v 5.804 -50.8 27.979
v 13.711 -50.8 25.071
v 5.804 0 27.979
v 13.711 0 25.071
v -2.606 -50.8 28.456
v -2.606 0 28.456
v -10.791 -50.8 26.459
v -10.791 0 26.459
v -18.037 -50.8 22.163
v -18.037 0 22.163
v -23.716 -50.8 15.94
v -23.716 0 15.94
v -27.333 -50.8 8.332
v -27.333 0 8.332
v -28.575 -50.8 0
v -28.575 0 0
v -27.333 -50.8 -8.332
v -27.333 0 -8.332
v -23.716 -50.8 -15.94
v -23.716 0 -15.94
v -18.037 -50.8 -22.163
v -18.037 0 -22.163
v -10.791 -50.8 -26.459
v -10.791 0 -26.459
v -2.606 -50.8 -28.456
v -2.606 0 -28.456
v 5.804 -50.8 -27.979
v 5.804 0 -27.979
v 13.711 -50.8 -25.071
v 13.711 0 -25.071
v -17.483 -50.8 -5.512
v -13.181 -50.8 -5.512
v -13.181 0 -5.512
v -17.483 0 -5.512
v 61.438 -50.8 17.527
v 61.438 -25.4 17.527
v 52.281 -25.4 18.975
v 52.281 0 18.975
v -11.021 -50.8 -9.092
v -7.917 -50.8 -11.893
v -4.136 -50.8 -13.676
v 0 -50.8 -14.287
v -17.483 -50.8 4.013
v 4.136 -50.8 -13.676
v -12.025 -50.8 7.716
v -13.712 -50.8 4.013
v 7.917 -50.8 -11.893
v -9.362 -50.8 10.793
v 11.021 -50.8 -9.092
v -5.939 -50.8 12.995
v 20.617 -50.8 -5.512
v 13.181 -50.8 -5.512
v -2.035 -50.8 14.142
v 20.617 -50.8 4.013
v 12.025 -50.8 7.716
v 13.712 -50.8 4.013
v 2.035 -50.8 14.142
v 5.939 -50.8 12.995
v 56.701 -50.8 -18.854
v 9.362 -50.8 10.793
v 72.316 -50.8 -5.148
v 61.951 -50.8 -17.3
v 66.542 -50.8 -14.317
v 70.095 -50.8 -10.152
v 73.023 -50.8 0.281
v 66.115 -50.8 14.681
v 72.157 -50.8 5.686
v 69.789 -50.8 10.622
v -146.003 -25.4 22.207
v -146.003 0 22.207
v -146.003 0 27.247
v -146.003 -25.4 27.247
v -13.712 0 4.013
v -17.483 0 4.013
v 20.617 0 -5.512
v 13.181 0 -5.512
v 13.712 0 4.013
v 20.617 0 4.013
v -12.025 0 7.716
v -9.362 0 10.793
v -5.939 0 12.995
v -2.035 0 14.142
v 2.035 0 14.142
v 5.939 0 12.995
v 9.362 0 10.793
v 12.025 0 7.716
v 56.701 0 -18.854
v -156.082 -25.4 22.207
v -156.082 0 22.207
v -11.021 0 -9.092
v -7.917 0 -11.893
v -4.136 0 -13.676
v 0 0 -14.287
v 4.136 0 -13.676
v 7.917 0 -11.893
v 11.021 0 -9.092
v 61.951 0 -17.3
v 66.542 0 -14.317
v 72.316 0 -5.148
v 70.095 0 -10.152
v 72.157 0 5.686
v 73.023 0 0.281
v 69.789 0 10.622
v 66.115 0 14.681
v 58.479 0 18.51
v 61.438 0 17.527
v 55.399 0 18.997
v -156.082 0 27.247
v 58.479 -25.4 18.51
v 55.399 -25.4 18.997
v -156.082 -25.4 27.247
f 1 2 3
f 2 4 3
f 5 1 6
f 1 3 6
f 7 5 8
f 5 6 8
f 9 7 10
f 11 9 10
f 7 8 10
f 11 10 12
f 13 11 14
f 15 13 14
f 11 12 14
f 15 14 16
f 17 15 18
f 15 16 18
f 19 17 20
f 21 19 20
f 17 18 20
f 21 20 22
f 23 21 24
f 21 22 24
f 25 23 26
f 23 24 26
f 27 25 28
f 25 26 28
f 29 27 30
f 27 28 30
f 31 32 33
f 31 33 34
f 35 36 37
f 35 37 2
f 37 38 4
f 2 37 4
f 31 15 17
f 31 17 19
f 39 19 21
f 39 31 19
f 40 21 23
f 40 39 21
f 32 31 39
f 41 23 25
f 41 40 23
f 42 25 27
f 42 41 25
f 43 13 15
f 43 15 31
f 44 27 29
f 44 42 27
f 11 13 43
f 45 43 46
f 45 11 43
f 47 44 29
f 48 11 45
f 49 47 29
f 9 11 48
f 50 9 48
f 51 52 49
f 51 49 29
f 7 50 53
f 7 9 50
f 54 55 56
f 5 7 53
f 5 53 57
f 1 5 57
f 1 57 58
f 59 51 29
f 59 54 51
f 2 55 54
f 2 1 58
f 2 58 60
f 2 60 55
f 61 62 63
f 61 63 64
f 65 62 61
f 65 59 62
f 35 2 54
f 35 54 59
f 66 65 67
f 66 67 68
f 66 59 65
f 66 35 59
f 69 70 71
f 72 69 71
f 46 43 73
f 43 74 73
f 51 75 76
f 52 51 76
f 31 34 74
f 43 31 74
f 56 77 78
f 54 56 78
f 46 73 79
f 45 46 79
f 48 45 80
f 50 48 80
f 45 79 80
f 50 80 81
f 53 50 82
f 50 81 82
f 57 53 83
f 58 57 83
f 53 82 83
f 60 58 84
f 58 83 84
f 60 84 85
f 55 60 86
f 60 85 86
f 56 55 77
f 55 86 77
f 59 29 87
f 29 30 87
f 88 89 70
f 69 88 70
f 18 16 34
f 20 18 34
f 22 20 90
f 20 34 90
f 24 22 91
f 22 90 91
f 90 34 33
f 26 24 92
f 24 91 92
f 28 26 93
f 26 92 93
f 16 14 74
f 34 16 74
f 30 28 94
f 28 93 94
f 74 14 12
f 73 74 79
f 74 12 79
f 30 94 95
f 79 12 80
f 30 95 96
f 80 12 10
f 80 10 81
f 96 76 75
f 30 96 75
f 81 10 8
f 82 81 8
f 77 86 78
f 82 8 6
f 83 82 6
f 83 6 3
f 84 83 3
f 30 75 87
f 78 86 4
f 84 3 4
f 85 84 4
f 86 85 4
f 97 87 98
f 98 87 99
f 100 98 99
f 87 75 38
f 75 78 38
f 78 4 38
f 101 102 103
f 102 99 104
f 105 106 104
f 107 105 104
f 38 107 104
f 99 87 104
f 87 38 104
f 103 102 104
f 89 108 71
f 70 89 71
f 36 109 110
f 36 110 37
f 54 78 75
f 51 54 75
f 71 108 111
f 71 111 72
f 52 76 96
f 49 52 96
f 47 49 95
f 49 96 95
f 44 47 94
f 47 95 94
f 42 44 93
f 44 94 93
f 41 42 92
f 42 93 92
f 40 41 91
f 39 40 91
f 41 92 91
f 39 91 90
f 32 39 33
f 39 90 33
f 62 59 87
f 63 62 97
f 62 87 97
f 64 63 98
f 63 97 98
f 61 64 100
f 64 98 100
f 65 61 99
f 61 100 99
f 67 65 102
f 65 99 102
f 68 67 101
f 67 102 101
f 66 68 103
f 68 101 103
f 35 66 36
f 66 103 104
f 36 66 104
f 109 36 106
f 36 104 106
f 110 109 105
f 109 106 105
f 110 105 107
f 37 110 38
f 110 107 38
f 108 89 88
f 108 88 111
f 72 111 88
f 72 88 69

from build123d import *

# Parameters (mm, degrees)
F0_R     = 14.2875
F1_DEPTH = 25.4
F2_DEPTH = 25.4
F3_DEPTH = 25.4
F5_DEPTH = 25.4
F0_W     = 10.0799947977
F0_H     = 5.0400011241


with BuildPart() as f1:
    # F0 (on Front) → F1 (new body)
    with BuildSketch(Plane.XZ):
        with BuildLine():
            ThreePointArc((13.7108012033, -25.0707908803), (24.5796335345, -14.572996957), (28.575, 0))
            ThreePointArc((28.575, 0), (24.5796335345, 14.572996957), (13.7108012033, 25.0707908803))
            ThreePointArc((13.7108012033, 25.0707908803), (-28.575, 0), (13.7108012033, -25.0707908803))
        make_face()
        with BuildLine():
            ThreePointArc((-13.7124942196, 4.0125002839), (0, 14.2875), (13.7124942196, 4.0125002839))
            Line((13.7124942196, 4.0125002839), (20.6174994767, 4.0125002839))
            Line((20.6174994767, 4.0125002839), (20.6174994767, -5.5124997161))
            Line((20.6174994767, -5.5124997161), (13.181236783, -5.5124997161))
            ThreePointArc((13.181236783, -5.5124997161), (0, -14.2875), (-13.181236783, -5.5124997161))
            Line((-13.181236783, -5.5124997161), (-17.4825005233, -5.5124997161))
            Line((-17.4825005233, -5.5124997161), (-17.4825005233, 4.0125002839))
            Line((-17.4825005233, 4.0125002839), (-13.7124942196, 4.0125002839))
        make_face(mode=Mode.SUBTRACT)
        with BuildLine():
            Line((61.4379927645, 17.5272998205), (52.2812851863, 18.9745574423))
            ThreePointArc((52.2812851863, 18.9745574423), (35.0537329802, -2.2109170872), (56.7014723756, -18.8538815204))
            ThreePointArc((56.7014723756, -18.8538815204), (68.3771144065, -12.4692261437), (73.025, 0))
            ThreePointArc((73.025, 0), (69.8663893691, 10.5055339664), (61.4379927645, 17.5272998205))
        make_face()
        with Locations((53.975, 0)):
            Circle(F0_R, mode=Mode.SUBTRACT)
        with BuildLine():
            ThreePointArc((13.7108012033, 25.0707908803), (24.5796335345, 14.572996957), (28.575, 0))
            ThreePointArc((28.575, 0), (24.5796335345, -14.572996957), (13.7108012033, -25.0707908803))
            Line((13.7108012033, -25.0707908803), (56.7014723756, -18.8538815204))
            ThreePointArc((56.7014723756, -18.8538815204), (35.0537329802, -2.2109170872), (52.2812851863, 18.9745574423))
            Line((52.2812851863, 18.9745574423), (13.7108012033, 25.0707908803))
        make_face()
        with Locations((53.975, 0)):
            Circle(F0_R)
    extrude(amount=F1_DEPTH)

    # F0 (on Front) → F2 (join)
    with BuildSketch(Plane.XZ):
        with BuildLine():
            ThreePointArc((13.7108012033, -25.0707908803), (24.5796335345, -14.572996957), (28.575, 0))
            ThreePointArc((28.575, 0), (24.5796335345, 14.572996957), (13.7108012033, 25.0707908803))
            ThreePointArc((13.7108012033, 25.0707908803), (-28.575, 0), (13.7108012033, -25.0707908803))
        make_face()
        with BuildLine():
            ThreePointArc((-13.7124942196, 4.0125002839), (0, 14.2875), (13.7124942196, 4.0125002839))
            Line((13.7124942196, 4.0125002839), (20.6174994767, 4.0125002839))
            Line((20.6174994767, 4.0125002839), (20.6174994767, -5.5124997161))
            Line((20.6174994767, -5.5124997161), (13.181236783, -5.5124997161))
            ThreePointArc((13.181236783, -5.5124997161), (0, -14.2875), (-13.181236783, -5.5124997161))
            Line((-13.181236783, -5.5124997161), (-17.4825005233, -5.5124997161))
            Line((-17.4825005233, -5.5124997161), (-17.4825005233, 4.0125002839))
            Line((-17.4825005233, 4.0125002839), (-13.7124942196, 4.0125002839))
        make_face(mode=Mode.SUBTRACT)
    extrude(amount=F2_DEPTH)

    # F0 (on Front) → F3 (join)
    with BuildSketch(Plane.XZ):
        with BuildLine():
            ThreePointArc((13.7108012033, 25.0707908803), (24.5796335345, 14.572996957), (28.575, 0))
            ThreePointArc((28.575, 0), (24.5796335345, -14.572996957), (13.7108012033, -25.0707908803))
            Line((13.7108012033, -25.0707908803), (56.7014723756, -18.8538815204))
            ThreePointArc((56.7014723756, -18.8538815204), (35.0537329802, -2.2109170872), (52.2812851863, 18.9745574423))
            Line((52.2812851863, 18.9745574423), (13.7108012033, 25.0707908803))
        make_face()
        with BuildLine():
            ThreePointArc((13.7108012033, -25.0707908803), (24.5796335345, -14.572996957), (28.575, 0))
            ThreePointArc((28.575, 0), (24.5796335345, 14.572996957), (13.7108012033, 25.0707908803))
            ThreePointArc((13.7108012033, 25.0707908803), (-28.575, 0), (13.7108012033, -25.0707908803))
        make_face()
        with BuildLine():
            ThreePointArc((-13.7124942196, 4.0125002839), (0, 14.2875), (13.7124942196, 4.0125002839))
            Line((13.7124942196, 4.0125002839), (20.6174994767, 4.0125002839))
            Line((20.6174994767, 4.0125002839), (20.6174994767, -5.5124997161))
            Line((20.6174994767, -5.5124997161), (13.181236783, -5.5124997161))
            ThreePointArc((13.181236783, -5.5124997161), (0, -14.2875), (-13.181236783, -5.5124997161))
            Line((-13.181236783, -5.5124997161), (-17.4825005233, -5.5124997161))
            Line((-17.4825005233, -5.5124997161), (-17.4825005233, 4.0125002839))
            Line((-17.4825005233, 4.0125002839), (-13.7124942196, 4.0125002839))
        make_face(mode=Mode.SUBTRACT)
        with BuildLine():
            Line((61.4379927645, 17.5272998205), (52.2812851863, 18.9745574423))
            ThreePointArc((52.2812851863, 18.9745574423), (35.0537329802, -2.2109170872), (56.7014723756, -18.8538815204))
            ThreePointArc((56.7014723756, -18.8538815204), (68.3771144065, -12.4692261437), (73.025, 0))
            ThreePointArc((73.025, 0), (69.8663893691, 10.5055339664), (61.4379927645, 17.5272998205))
        make_face()
        with Locations((53.975, 0)):
            Circle(F0_R, mode=Mode.SUBTRACT)
    extrude(amount=F3_DEPTH)

    # F4 (on face) + F0 (on Front) → F5 (join)
    with BuildSketch(Plane.XZ.offset(25.4)):
        with BuildLine():
            Line((61.4379927645, 17.5272998205), (13.7108012033, 25.0707908803))
            ThreePointArc((13.7108012033, 25.0707908803), (-28.575, 0), (13.7108012033, -25.0707908803))
            Line((13.7108012033, -25.0707908803), (56.7014723756, -18.8538815204))
            ThreePointArc((56.7014723756, -18.8538815204), (72.8655767223, -2.459392425), (61.4379927645, 17.5272998205))
        make_face()
        with BuildLine():
            Line((-17.4825005233, 4.0125002839), (-13.7124942196, 4.0125002839))
            ThreePointArc((-13.7124942196, 4.0125002839), (0, 14.2875), (13.7124942196, 4.0125002839))
            Line((13.7124942196, 4.0125002839), (20.6174994767, 4.0125002839))
            Line((20.6174994767, 4.0125002839), (20.6174994767, -5.5124997161))
            Line((20.6174994767, -5.5124997161), (13.181236783, -5.5124997161))
            ThreePointArc((13.181236783, -5.5124997161), (0, -14.2875), (-13.181236783, -5.5124997161))
            Line((-13.181236783, -5.5124997161), (-17.4825005233, -5.5124997161))
            Line((-17.4825005233, -5.5124997161), (-17.4825005233, 4.0125002839))
        make_face(mode=Mode.SUBTRACT)
    with BuildSketch(Plane.XZ):
        with BuildLine():
            ThreePointArc((13.7108012033, -25.0707908803), (24.5796335345, -14.572996957), (28.575, 0))
            ThreePointArc((28.575, 0), (24.5796335345, 14.572996957), (13.7108012033, 25.0707908803))
            ThreePointArc((13.7108012033, 25.0707908803), (-28.575, 0), (13.7108012033, -25.0707908803))
        make_face()
        with BuildLine():
            ThreePointArc((-13.7124942196, 4.0125002839), (0, 14.2875), (13.7124942196, 4.0125002839))
            Line((13.7124942196, 4.0125002839), (20.6174994767, 4.0125002839))
            Line((20.6174994767, 4.0125002839), (20.6174994767, -5.5124997161))
            Line((20.6174994767, -5.5124997161), (13.181236783, -5.5124997161))
            ThreePointArc((13.181236783, -5.5124997161), (0, -14.2875), (-13.181236783, -5.5124997161))
            Line((-13.181236783, -5.5124997161), (-17.4825005233, -5.5124997161))
            Line((-17.4825005233, -5.5124997161), (-17.4825005233, 4.0125002839))
            Line((-17.4825005233, 4.0125002839), (-13.7124942196, 4.0125002839))
        make_face(mode=Mode.SUBTRACT)
        with BuildLine():
            ThreePointArc((13.7108012033, 25.0707908803), (24.5796335345, 14.572996957), (28.575, 0))
            ThreePointArc((28.575, 0), (24.5796335345, -14.572996957), (13.7108012033, -25.0707908803))
            Line((13.7108012033, -25.0707908803), (56.7014723756, -18.8538815204))
            ThreePointArc((56.7014723756, -18.8538815204), (35.0537329802, -2.2109170872), (52.2812851863, 18.9745574423))
            Line((52.2812851863, 18.9745574423), (13.7108012033, 25.0707908803))
        make_face()
        with BuildLine():
            Line((61.4379927645, 17.5272998205), (52.2812851863, 18.9745574423))
            ThreePointArc((52.2812851863, 18.9745574423), (35.0537329802, -2.2109170872), (56.7014723756, -18.8538815204))
            ThreePointArc((56.7014723756, -18.8538815204), (68.3771144065, -12.4692261437), (73.025, 0))
            ThreePointArc((73.025, 0), (69.8663893691, 10.5055339664), (61.4379927645, 17.5272998205))
        make_face()
        with Locations((53.975, 0)):
            Circle(F0_R, mode=Mode.SUBTRACT)
        with BuildLine():
            ThreePointArc((61.4379927645, 17.5272998205), (56.9490175982, 18.8164215335), (52.2812851863, 18.9745574423))
            Line((52.2812851863, 18.9745574423), (61.4379927645, 17.5272998205))
        make_face()
    extrude(amount=F5_DEPTH)


with BuildPart() as f5:
    # F0 (on Front) → F5, piece 2 (new body)
    with BuildSketch(Plane.XZ):
        with Locations((-151.0424986482, 24.7274991125)):
            Rectangle(F0_W, F0_H)
    extrude(amount=F5_DEPTH)


solid = Compound([f1.part, f5.part])
